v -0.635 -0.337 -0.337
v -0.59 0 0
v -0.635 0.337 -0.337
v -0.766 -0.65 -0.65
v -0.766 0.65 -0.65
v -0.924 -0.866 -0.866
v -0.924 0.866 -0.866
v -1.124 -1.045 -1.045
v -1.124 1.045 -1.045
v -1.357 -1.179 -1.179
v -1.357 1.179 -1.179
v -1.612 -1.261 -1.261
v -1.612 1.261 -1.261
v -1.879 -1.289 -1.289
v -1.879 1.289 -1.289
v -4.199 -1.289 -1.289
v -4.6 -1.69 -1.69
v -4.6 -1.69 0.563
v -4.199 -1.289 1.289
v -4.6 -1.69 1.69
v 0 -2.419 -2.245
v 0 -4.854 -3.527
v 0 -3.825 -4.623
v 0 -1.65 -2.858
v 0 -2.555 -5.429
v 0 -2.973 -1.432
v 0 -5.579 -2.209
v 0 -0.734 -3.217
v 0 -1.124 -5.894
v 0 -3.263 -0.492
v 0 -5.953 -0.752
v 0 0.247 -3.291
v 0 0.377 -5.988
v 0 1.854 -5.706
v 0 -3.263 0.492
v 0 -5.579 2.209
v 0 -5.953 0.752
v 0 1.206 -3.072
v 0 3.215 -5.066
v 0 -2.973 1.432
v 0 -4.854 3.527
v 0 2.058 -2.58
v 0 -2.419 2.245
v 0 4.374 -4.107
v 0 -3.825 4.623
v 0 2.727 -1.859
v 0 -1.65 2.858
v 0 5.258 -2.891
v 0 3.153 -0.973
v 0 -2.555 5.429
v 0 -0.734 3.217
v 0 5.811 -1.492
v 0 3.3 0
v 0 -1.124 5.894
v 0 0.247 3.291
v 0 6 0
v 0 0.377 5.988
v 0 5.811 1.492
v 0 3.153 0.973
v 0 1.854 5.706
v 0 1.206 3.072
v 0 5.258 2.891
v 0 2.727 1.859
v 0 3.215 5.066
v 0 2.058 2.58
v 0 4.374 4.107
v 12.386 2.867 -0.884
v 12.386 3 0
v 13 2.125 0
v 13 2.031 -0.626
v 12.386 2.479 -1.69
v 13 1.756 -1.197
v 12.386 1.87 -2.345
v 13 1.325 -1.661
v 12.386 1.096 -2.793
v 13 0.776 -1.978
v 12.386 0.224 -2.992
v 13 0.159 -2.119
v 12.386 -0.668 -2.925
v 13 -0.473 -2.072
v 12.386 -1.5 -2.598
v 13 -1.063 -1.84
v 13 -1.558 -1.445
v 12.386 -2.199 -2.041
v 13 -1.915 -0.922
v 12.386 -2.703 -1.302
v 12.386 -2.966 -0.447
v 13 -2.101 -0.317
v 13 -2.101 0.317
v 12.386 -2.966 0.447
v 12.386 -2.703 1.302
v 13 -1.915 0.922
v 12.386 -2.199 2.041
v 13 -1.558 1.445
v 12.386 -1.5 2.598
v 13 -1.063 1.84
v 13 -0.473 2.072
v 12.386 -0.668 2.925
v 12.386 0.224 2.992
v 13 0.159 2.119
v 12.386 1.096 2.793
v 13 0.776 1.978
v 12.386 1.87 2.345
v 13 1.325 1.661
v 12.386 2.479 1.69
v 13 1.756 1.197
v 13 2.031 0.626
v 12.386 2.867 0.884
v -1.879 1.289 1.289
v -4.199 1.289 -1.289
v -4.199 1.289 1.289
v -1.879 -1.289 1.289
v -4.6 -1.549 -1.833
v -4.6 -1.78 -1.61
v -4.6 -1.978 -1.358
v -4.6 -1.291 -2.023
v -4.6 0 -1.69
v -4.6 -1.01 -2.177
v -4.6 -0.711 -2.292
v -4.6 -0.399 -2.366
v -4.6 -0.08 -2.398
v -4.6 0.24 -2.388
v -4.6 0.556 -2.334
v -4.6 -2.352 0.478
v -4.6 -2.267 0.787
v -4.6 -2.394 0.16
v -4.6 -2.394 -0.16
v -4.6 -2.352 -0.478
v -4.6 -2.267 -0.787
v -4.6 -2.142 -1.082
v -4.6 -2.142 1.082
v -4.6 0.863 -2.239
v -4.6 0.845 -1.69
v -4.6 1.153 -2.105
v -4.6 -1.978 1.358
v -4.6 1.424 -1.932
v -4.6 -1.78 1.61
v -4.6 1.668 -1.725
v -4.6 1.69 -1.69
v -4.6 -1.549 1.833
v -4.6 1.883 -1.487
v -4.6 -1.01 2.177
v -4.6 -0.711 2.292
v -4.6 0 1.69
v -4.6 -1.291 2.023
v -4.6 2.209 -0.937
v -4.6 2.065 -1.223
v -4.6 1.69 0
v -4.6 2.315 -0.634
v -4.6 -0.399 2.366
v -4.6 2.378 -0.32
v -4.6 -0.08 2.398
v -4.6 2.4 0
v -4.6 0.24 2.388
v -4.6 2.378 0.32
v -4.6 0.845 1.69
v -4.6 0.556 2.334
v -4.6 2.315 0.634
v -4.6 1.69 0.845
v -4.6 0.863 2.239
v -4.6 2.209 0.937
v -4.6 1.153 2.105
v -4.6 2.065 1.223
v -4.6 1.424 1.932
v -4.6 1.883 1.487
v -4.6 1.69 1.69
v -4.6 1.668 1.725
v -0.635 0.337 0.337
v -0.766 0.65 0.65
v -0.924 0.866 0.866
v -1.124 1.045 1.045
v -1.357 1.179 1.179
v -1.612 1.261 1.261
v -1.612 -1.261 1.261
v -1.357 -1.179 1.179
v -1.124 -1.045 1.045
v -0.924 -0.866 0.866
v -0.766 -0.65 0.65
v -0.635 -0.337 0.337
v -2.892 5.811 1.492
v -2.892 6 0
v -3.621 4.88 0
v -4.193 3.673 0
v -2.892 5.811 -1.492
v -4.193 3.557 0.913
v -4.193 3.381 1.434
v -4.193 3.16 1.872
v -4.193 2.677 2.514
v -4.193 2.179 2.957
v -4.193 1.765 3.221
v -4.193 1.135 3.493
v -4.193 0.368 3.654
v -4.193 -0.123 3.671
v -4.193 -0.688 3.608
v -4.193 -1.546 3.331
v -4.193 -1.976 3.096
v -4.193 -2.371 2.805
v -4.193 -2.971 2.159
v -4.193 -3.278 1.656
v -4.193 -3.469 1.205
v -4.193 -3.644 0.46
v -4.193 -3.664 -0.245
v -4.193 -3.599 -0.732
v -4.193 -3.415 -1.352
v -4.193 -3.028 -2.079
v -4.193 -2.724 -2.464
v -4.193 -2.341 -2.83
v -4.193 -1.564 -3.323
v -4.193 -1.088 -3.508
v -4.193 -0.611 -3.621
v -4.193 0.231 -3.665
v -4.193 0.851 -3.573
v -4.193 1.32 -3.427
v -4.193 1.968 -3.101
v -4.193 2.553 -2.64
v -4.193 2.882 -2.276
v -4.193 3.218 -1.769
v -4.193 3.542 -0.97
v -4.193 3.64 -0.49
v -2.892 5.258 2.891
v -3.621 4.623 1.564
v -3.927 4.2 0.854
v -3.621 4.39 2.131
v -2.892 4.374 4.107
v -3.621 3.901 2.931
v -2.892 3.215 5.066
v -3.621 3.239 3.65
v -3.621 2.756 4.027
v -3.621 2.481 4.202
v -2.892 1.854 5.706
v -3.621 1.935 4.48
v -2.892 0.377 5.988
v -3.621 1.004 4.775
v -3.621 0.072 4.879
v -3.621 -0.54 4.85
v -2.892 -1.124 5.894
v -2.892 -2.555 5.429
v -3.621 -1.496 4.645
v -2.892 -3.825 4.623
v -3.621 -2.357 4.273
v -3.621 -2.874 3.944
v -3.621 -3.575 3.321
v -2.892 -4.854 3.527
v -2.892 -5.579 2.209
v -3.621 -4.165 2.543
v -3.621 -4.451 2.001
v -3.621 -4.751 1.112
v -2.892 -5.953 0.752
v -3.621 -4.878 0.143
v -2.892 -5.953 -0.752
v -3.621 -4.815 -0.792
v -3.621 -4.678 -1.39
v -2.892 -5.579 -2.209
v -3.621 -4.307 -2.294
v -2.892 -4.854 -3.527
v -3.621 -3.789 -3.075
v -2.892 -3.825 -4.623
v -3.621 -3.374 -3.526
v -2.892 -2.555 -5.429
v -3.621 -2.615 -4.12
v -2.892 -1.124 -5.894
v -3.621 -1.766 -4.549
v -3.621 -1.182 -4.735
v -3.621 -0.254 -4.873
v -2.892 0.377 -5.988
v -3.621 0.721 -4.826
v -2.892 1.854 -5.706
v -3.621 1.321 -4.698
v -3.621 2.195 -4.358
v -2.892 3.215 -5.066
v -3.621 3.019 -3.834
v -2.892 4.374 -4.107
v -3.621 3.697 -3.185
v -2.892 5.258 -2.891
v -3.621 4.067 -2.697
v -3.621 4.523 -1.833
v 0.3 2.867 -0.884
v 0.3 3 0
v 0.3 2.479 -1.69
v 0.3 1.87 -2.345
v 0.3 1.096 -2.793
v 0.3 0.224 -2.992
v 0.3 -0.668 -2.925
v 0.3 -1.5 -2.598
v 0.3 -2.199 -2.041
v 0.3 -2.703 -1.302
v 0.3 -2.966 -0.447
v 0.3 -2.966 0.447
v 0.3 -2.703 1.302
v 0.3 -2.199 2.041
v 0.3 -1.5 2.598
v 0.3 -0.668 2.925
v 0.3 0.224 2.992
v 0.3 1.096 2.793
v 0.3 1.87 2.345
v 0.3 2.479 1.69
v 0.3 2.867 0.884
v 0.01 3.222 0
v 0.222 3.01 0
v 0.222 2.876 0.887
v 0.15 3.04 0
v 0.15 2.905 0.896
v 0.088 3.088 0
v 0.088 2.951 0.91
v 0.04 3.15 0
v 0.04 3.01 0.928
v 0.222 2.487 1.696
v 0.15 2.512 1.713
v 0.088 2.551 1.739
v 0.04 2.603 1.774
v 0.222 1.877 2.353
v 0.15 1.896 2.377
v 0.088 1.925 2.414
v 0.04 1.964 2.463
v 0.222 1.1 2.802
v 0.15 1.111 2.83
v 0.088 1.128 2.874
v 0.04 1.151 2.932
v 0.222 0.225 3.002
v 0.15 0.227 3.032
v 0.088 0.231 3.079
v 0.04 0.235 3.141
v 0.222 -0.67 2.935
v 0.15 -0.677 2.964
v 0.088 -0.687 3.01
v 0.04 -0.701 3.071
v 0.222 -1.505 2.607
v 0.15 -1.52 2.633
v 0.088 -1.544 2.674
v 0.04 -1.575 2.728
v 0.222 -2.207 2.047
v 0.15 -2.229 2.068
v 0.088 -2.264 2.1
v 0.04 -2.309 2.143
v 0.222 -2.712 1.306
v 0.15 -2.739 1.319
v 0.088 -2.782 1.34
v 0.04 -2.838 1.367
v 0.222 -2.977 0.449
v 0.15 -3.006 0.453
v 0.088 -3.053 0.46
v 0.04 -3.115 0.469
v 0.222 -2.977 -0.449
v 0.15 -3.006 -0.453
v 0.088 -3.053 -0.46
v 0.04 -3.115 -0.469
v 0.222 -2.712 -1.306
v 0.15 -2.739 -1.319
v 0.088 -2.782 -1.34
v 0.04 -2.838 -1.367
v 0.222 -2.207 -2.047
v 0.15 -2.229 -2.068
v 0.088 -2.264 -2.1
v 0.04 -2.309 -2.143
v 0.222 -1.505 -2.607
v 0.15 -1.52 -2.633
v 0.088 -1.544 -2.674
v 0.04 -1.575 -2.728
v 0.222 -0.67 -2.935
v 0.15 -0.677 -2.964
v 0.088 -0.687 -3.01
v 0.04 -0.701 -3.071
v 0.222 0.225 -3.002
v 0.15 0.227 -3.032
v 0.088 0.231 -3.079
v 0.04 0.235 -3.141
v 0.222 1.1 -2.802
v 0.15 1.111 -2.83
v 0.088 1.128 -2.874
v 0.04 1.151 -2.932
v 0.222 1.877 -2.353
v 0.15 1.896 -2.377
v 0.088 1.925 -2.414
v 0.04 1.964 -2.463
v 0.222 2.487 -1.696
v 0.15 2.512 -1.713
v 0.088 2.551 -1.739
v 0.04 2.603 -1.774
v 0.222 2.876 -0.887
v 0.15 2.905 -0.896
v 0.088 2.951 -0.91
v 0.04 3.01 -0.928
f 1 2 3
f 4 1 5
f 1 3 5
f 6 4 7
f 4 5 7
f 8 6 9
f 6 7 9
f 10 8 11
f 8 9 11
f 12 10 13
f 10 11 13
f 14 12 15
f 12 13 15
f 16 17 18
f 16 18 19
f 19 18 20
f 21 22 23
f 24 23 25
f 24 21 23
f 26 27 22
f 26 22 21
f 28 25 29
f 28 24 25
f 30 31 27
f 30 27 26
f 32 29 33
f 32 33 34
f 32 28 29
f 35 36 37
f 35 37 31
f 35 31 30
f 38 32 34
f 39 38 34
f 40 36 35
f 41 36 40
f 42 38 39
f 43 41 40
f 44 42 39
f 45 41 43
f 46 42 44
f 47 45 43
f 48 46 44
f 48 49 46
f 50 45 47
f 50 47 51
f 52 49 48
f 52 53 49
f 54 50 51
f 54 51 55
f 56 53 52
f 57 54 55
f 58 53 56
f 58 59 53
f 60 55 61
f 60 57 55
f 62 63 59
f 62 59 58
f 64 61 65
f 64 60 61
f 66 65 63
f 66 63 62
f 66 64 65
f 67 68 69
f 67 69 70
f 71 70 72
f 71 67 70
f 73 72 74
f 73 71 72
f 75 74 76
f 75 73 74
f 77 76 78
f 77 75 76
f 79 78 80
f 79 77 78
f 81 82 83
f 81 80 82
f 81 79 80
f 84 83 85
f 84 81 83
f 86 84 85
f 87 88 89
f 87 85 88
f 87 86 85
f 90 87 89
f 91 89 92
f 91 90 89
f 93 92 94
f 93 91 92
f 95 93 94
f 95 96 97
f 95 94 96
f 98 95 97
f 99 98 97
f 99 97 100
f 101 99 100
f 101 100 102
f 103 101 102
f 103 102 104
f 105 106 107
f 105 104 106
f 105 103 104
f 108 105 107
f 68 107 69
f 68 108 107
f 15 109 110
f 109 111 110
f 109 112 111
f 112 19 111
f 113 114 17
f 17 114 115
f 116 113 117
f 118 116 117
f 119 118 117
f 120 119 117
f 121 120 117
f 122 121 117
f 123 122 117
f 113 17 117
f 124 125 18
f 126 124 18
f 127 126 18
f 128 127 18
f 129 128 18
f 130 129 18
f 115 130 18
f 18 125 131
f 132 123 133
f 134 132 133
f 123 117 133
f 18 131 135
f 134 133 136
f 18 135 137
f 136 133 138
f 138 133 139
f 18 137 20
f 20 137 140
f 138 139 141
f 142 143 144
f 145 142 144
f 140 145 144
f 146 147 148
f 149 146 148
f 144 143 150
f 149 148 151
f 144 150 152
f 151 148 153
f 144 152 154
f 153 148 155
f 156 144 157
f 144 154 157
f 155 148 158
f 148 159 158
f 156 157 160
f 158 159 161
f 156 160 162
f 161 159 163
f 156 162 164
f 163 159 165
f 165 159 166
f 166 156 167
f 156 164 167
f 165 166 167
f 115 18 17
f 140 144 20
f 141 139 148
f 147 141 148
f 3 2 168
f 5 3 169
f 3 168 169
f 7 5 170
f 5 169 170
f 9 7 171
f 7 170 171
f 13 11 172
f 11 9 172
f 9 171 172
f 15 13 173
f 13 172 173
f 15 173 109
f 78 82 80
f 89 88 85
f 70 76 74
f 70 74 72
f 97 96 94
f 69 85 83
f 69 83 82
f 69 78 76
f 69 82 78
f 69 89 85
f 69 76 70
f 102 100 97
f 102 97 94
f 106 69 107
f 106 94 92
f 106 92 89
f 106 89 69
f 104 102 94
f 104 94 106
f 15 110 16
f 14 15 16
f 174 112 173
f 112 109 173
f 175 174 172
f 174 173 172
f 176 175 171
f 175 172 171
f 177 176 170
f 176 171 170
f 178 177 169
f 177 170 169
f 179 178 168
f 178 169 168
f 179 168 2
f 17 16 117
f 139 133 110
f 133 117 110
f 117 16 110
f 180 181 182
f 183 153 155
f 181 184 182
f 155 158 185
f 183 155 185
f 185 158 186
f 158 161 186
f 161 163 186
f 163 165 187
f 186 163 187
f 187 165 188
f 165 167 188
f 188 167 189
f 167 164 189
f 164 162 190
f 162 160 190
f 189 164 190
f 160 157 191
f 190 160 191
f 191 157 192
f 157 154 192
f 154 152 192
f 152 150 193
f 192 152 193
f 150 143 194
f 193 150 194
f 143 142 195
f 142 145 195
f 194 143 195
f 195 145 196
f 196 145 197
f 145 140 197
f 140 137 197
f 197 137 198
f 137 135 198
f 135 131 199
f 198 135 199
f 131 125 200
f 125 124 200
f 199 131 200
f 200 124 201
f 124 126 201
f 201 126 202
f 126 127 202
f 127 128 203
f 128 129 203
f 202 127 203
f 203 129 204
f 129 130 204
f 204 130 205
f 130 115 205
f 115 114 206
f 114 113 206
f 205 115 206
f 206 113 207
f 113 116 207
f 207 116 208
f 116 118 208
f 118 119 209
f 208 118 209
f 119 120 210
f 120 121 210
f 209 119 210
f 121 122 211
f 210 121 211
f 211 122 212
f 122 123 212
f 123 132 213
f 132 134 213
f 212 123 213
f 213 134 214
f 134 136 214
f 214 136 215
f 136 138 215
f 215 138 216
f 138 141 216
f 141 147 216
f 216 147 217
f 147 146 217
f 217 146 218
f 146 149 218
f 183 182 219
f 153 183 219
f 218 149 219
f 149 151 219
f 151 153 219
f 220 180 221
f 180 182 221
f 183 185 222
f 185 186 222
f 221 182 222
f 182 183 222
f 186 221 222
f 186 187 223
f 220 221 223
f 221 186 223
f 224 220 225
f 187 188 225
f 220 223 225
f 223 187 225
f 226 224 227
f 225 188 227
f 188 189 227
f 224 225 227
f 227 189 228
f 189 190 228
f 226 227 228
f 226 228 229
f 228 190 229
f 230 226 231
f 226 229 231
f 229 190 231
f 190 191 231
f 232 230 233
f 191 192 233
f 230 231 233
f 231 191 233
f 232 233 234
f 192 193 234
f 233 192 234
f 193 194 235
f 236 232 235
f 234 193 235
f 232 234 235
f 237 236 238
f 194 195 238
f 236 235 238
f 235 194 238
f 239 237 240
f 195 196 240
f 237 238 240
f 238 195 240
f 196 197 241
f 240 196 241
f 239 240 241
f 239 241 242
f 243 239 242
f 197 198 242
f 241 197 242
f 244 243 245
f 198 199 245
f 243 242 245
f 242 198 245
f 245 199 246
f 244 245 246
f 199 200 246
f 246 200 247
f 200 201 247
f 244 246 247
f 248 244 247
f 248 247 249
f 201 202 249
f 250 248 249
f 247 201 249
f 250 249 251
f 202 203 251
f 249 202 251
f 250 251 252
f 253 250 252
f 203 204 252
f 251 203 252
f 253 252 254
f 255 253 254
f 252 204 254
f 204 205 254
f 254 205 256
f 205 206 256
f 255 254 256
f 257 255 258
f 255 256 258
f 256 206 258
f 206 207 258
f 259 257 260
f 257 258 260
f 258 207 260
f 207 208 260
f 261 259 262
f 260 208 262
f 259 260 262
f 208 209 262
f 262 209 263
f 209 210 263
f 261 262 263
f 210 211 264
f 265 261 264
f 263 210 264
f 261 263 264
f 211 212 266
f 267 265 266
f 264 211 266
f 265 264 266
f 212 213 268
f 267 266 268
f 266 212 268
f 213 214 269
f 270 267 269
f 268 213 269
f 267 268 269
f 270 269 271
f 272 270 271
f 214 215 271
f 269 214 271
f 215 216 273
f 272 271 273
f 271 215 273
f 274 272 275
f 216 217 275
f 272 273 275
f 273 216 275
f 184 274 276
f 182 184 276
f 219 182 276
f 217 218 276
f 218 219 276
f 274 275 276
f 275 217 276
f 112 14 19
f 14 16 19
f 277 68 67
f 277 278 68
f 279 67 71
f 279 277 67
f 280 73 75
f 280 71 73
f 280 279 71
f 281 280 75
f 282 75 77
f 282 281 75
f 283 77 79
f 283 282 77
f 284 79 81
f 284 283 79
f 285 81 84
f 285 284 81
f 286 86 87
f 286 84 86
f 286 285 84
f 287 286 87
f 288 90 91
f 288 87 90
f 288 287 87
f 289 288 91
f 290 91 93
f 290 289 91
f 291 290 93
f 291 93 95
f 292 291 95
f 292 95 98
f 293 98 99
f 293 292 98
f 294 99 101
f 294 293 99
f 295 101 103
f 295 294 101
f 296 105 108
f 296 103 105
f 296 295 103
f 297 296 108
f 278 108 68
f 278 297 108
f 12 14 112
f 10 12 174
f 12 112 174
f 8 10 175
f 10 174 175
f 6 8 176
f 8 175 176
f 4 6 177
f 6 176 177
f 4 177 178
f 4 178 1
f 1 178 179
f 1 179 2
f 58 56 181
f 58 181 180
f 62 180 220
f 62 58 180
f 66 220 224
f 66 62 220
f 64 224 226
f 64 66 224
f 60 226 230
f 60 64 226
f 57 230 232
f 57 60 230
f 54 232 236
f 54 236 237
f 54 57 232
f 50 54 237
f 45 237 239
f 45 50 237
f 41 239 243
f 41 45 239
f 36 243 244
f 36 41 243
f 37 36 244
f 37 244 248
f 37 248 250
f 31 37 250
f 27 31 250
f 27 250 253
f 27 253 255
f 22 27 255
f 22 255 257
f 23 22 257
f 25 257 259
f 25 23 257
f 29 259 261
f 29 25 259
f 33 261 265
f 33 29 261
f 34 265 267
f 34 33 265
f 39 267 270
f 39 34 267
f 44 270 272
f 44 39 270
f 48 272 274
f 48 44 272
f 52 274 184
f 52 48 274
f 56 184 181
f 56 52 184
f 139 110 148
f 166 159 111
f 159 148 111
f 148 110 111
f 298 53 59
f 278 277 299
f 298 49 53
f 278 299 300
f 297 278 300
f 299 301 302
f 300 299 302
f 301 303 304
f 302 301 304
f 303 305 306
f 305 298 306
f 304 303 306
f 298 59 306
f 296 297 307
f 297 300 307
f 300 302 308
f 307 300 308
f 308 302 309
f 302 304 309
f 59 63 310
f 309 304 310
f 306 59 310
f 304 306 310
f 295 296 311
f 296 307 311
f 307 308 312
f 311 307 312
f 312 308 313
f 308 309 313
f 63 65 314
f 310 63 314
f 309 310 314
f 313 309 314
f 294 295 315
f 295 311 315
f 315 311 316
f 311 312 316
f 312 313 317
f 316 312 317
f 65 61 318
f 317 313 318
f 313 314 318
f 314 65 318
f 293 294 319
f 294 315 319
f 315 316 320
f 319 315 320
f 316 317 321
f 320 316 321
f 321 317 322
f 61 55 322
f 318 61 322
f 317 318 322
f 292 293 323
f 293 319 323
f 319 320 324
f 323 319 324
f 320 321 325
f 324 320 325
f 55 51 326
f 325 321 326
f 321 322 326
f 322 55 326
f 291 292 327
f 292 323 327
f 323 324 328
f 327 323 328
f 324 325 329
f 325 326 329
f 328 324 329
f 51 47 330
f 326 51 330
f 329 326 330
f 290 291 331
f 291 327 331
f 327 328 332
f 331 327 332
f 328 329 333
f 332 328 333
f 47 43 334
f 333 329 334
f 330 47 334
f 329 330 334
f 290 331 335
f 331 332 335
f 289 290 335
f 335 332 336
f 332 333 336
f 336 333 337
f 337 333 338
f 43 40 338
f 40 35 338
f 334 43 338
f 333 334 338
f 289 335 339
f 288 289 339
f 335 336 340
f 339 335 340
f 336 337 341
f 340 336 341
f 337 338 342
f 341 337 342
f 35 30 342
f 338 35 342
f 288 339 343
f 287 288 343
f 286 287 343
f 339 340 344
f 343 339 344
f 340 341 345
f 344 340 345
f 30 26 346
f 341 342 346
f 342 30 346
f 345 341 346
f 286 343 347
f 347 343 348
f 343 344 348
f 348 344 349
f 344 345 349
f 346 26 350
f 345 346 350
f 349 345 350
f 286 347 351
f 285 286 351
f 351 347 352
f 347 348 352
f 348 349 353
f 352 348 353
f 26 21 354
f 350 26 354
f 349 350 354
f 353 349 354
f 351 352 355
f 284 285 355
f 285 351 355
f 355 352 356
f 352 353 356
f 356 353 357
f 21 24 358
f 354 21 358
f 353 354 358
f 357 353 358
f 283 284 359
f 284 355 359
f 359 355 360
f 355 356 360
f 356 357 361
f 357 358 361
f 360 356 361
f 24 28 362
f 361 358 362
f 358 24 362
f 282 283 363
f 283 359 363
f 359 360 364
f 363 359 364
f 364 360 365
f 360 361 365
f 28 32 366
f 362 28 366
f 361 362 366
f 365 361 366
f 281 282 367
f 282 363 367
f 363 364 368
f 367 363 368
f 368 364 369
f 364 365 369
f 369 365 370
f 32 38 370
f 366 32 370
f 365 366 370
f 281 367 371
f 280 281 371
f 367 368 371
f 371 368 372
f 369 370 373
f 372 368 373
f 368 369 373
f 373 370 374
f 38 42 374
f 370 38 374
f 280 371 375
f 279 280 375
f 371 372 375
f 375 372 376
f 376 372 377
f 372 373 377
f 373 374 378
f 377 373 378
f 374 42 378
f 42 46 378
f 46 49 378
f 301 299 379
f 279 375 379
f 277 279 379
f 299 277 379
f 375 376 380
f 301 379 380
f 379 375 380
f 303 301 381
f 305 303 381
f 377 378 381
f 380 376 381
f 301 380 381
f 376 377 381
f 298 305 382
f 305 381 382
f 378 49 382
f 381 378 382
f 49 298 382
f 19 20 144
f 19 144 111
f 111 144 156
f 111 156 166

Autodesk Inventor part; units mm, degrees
ref_plane "YZ Plane" through (0, 0, 0) normal (1, 0, 0) x (0, 1, 0)
sketch "Sketch1" plane through (0, 0, 0) normal (0, 0, 1) x (1, 0, 0)
  line L0 (-0.59, 0) -> (13, 0)
  line L1 (13, 0) -> (13, 3)
  line L2 (13, 3) -> (0, 3)
  line L3 (0, 3) -> (0, 6)
  line L4 (-8.7003, 0) -> (16.6167, 0) projected
  line L5 (0, -1.2172) -> (0, 7.3031) projected
  line L6 (-4.6, 2.3998) -> (-5.0836, 2.3998) construction
  line L7 (-4.6, 0) -> (-0.59, 0)
  line L8 (0, 0) -> (-0.59, 0)
  line L9 (-4.6, 0) -> (-4.6, 6)
  arc A0 (-2.8922, 6) -> (-4.6, 2.3998) centre (5.1078, 0) ccw
  line L10 (-4.6, 6) -> (0, 6)
  dimension "d0" = 13
  dimension "d1" = 6
  dimension "d2" = 12
  dimension "d4" = 4.7996
  dimension "d13" = 4.6
  dimension "d14" = 4.01
  dimension "d46" = 10
  dimension "d47" = 0
revolve "Body" add sketch "Sketch1" angle 360 about axis through (-0.59, 0, 0) along (1, 0, 0) contours L4 L9 A0 L10 L3 L5 L0 | L5 L2 L1 L0
ref_plane "IDS_WORKPLANE{1}" through (-4.6, 0, 0) normal (1, 0, 0) x (0, 0, -1)
sketch "Sketch2" plane through (-4.6, 0, 0) normal (1, 0, 0) x (0, 0, -1)
  line L0 (0, -8.4) -> (0, 8.4) projected
  line L1 (8.4, 0) -> (-8.4, 0) projected
  line L2 (-1.289, 1.289) -> (1.289, 1.289)
  line L3 (1.289, 1.289) -> (1.289, -1.289)
  line L4 (1.289, -1.289) -> (-1.289, -1.289)
  line L5 (-1.289, -1.289) -> (-1.289, 1.289)
  line L6 (0, 1.289) -> (0, -1.289) construction
  line L7 (-1.289, 0) -> (1.289, 0) construction
  dimension "d7" = 2.578
  dimension "d9" = 2.578
extrude "Extrusion" cut sketch "Sketch2" along normal blind 4.01
fillet "Fillet1" radius 1.289 4 edges at (-0.59, 0, -1.289) (-0.59, -1.289, 0) (-0.59, 0, 1.289) (-0.59, 1.289, 0)
chamfer "Chamfer1" distance 0.401 angle 45 4 edges at (-4.6, 1.289, 0) (-4.6, 0, -1.289) (-4.6, -1.289, 0) (-4.6, 0, 1.289)
thread "Thread" size "M6x1" class "6g" standard "ISO Metric profile" length 12
chamfer "Chamfer2" distance 0.875 distance2 0.6135 1 edges at (13, -3, 0) measured on face at (13, -1.1424, 0.935)
ref_plane "Work Plane2" through (69.85, 0, 0) normal (0, 0, -1) x (1, 0, 0)
fillet "Fillet2" radius 0.3 1 edges at (0, -3, 0)
equation "\"d0\" = NLG"
equation "\"d1\" = GD"
equation "\"d2\" = KOD"
equation "\"d4\" = 1.42 * KOM"
equation "\"d13\" = KOH"
equation "\"d14\" = STI"
equation "\"d46\" = KR"
equation "\"d7\" = KOM - 0.2 * STI"
equation "\"d9\" = KOM - 0.2 * STI"
equation "\"d48\" = STI"
equation "\"d50\" = -0.1 * STI + 0.5 * KOM"
equation "\"d51\" = 0.1 * STI"
equation "\"d18\" = GEL"
equation "\"d20\" = -0.5 * SPD + 0.5 * GD"
equation "\"d21\" = GUL"
equation "\"d44\" = R"
equation "\"GD\" = 6"
equation "\"NLG\" = 13"
equation "\"GEL\" = 12"
equation "\"KOD\" = 12"
equation "\"KOH\" = 4.6"
equation "\"SPD\" = 4.25"
equation "\"KR\" = 10"
equation "\"RR\" = 2"
equation "\"GUL\" = 0.61345 * PTC"
equation "\"KEWI\" = 0"
equation "\"SDM\" = 3.38"
equation "\"STI\" = 4.01"
equation "\"d6\" = -KOH"
equation "\"R\" = 0.3"
equation "\"KOM\" = 3.38"
equation "\"PTC\" = 1"
properties part number "ANSI B18.6.7M - M6x1 x 13, SRPHMSTIM" material "Steel, Mild"
